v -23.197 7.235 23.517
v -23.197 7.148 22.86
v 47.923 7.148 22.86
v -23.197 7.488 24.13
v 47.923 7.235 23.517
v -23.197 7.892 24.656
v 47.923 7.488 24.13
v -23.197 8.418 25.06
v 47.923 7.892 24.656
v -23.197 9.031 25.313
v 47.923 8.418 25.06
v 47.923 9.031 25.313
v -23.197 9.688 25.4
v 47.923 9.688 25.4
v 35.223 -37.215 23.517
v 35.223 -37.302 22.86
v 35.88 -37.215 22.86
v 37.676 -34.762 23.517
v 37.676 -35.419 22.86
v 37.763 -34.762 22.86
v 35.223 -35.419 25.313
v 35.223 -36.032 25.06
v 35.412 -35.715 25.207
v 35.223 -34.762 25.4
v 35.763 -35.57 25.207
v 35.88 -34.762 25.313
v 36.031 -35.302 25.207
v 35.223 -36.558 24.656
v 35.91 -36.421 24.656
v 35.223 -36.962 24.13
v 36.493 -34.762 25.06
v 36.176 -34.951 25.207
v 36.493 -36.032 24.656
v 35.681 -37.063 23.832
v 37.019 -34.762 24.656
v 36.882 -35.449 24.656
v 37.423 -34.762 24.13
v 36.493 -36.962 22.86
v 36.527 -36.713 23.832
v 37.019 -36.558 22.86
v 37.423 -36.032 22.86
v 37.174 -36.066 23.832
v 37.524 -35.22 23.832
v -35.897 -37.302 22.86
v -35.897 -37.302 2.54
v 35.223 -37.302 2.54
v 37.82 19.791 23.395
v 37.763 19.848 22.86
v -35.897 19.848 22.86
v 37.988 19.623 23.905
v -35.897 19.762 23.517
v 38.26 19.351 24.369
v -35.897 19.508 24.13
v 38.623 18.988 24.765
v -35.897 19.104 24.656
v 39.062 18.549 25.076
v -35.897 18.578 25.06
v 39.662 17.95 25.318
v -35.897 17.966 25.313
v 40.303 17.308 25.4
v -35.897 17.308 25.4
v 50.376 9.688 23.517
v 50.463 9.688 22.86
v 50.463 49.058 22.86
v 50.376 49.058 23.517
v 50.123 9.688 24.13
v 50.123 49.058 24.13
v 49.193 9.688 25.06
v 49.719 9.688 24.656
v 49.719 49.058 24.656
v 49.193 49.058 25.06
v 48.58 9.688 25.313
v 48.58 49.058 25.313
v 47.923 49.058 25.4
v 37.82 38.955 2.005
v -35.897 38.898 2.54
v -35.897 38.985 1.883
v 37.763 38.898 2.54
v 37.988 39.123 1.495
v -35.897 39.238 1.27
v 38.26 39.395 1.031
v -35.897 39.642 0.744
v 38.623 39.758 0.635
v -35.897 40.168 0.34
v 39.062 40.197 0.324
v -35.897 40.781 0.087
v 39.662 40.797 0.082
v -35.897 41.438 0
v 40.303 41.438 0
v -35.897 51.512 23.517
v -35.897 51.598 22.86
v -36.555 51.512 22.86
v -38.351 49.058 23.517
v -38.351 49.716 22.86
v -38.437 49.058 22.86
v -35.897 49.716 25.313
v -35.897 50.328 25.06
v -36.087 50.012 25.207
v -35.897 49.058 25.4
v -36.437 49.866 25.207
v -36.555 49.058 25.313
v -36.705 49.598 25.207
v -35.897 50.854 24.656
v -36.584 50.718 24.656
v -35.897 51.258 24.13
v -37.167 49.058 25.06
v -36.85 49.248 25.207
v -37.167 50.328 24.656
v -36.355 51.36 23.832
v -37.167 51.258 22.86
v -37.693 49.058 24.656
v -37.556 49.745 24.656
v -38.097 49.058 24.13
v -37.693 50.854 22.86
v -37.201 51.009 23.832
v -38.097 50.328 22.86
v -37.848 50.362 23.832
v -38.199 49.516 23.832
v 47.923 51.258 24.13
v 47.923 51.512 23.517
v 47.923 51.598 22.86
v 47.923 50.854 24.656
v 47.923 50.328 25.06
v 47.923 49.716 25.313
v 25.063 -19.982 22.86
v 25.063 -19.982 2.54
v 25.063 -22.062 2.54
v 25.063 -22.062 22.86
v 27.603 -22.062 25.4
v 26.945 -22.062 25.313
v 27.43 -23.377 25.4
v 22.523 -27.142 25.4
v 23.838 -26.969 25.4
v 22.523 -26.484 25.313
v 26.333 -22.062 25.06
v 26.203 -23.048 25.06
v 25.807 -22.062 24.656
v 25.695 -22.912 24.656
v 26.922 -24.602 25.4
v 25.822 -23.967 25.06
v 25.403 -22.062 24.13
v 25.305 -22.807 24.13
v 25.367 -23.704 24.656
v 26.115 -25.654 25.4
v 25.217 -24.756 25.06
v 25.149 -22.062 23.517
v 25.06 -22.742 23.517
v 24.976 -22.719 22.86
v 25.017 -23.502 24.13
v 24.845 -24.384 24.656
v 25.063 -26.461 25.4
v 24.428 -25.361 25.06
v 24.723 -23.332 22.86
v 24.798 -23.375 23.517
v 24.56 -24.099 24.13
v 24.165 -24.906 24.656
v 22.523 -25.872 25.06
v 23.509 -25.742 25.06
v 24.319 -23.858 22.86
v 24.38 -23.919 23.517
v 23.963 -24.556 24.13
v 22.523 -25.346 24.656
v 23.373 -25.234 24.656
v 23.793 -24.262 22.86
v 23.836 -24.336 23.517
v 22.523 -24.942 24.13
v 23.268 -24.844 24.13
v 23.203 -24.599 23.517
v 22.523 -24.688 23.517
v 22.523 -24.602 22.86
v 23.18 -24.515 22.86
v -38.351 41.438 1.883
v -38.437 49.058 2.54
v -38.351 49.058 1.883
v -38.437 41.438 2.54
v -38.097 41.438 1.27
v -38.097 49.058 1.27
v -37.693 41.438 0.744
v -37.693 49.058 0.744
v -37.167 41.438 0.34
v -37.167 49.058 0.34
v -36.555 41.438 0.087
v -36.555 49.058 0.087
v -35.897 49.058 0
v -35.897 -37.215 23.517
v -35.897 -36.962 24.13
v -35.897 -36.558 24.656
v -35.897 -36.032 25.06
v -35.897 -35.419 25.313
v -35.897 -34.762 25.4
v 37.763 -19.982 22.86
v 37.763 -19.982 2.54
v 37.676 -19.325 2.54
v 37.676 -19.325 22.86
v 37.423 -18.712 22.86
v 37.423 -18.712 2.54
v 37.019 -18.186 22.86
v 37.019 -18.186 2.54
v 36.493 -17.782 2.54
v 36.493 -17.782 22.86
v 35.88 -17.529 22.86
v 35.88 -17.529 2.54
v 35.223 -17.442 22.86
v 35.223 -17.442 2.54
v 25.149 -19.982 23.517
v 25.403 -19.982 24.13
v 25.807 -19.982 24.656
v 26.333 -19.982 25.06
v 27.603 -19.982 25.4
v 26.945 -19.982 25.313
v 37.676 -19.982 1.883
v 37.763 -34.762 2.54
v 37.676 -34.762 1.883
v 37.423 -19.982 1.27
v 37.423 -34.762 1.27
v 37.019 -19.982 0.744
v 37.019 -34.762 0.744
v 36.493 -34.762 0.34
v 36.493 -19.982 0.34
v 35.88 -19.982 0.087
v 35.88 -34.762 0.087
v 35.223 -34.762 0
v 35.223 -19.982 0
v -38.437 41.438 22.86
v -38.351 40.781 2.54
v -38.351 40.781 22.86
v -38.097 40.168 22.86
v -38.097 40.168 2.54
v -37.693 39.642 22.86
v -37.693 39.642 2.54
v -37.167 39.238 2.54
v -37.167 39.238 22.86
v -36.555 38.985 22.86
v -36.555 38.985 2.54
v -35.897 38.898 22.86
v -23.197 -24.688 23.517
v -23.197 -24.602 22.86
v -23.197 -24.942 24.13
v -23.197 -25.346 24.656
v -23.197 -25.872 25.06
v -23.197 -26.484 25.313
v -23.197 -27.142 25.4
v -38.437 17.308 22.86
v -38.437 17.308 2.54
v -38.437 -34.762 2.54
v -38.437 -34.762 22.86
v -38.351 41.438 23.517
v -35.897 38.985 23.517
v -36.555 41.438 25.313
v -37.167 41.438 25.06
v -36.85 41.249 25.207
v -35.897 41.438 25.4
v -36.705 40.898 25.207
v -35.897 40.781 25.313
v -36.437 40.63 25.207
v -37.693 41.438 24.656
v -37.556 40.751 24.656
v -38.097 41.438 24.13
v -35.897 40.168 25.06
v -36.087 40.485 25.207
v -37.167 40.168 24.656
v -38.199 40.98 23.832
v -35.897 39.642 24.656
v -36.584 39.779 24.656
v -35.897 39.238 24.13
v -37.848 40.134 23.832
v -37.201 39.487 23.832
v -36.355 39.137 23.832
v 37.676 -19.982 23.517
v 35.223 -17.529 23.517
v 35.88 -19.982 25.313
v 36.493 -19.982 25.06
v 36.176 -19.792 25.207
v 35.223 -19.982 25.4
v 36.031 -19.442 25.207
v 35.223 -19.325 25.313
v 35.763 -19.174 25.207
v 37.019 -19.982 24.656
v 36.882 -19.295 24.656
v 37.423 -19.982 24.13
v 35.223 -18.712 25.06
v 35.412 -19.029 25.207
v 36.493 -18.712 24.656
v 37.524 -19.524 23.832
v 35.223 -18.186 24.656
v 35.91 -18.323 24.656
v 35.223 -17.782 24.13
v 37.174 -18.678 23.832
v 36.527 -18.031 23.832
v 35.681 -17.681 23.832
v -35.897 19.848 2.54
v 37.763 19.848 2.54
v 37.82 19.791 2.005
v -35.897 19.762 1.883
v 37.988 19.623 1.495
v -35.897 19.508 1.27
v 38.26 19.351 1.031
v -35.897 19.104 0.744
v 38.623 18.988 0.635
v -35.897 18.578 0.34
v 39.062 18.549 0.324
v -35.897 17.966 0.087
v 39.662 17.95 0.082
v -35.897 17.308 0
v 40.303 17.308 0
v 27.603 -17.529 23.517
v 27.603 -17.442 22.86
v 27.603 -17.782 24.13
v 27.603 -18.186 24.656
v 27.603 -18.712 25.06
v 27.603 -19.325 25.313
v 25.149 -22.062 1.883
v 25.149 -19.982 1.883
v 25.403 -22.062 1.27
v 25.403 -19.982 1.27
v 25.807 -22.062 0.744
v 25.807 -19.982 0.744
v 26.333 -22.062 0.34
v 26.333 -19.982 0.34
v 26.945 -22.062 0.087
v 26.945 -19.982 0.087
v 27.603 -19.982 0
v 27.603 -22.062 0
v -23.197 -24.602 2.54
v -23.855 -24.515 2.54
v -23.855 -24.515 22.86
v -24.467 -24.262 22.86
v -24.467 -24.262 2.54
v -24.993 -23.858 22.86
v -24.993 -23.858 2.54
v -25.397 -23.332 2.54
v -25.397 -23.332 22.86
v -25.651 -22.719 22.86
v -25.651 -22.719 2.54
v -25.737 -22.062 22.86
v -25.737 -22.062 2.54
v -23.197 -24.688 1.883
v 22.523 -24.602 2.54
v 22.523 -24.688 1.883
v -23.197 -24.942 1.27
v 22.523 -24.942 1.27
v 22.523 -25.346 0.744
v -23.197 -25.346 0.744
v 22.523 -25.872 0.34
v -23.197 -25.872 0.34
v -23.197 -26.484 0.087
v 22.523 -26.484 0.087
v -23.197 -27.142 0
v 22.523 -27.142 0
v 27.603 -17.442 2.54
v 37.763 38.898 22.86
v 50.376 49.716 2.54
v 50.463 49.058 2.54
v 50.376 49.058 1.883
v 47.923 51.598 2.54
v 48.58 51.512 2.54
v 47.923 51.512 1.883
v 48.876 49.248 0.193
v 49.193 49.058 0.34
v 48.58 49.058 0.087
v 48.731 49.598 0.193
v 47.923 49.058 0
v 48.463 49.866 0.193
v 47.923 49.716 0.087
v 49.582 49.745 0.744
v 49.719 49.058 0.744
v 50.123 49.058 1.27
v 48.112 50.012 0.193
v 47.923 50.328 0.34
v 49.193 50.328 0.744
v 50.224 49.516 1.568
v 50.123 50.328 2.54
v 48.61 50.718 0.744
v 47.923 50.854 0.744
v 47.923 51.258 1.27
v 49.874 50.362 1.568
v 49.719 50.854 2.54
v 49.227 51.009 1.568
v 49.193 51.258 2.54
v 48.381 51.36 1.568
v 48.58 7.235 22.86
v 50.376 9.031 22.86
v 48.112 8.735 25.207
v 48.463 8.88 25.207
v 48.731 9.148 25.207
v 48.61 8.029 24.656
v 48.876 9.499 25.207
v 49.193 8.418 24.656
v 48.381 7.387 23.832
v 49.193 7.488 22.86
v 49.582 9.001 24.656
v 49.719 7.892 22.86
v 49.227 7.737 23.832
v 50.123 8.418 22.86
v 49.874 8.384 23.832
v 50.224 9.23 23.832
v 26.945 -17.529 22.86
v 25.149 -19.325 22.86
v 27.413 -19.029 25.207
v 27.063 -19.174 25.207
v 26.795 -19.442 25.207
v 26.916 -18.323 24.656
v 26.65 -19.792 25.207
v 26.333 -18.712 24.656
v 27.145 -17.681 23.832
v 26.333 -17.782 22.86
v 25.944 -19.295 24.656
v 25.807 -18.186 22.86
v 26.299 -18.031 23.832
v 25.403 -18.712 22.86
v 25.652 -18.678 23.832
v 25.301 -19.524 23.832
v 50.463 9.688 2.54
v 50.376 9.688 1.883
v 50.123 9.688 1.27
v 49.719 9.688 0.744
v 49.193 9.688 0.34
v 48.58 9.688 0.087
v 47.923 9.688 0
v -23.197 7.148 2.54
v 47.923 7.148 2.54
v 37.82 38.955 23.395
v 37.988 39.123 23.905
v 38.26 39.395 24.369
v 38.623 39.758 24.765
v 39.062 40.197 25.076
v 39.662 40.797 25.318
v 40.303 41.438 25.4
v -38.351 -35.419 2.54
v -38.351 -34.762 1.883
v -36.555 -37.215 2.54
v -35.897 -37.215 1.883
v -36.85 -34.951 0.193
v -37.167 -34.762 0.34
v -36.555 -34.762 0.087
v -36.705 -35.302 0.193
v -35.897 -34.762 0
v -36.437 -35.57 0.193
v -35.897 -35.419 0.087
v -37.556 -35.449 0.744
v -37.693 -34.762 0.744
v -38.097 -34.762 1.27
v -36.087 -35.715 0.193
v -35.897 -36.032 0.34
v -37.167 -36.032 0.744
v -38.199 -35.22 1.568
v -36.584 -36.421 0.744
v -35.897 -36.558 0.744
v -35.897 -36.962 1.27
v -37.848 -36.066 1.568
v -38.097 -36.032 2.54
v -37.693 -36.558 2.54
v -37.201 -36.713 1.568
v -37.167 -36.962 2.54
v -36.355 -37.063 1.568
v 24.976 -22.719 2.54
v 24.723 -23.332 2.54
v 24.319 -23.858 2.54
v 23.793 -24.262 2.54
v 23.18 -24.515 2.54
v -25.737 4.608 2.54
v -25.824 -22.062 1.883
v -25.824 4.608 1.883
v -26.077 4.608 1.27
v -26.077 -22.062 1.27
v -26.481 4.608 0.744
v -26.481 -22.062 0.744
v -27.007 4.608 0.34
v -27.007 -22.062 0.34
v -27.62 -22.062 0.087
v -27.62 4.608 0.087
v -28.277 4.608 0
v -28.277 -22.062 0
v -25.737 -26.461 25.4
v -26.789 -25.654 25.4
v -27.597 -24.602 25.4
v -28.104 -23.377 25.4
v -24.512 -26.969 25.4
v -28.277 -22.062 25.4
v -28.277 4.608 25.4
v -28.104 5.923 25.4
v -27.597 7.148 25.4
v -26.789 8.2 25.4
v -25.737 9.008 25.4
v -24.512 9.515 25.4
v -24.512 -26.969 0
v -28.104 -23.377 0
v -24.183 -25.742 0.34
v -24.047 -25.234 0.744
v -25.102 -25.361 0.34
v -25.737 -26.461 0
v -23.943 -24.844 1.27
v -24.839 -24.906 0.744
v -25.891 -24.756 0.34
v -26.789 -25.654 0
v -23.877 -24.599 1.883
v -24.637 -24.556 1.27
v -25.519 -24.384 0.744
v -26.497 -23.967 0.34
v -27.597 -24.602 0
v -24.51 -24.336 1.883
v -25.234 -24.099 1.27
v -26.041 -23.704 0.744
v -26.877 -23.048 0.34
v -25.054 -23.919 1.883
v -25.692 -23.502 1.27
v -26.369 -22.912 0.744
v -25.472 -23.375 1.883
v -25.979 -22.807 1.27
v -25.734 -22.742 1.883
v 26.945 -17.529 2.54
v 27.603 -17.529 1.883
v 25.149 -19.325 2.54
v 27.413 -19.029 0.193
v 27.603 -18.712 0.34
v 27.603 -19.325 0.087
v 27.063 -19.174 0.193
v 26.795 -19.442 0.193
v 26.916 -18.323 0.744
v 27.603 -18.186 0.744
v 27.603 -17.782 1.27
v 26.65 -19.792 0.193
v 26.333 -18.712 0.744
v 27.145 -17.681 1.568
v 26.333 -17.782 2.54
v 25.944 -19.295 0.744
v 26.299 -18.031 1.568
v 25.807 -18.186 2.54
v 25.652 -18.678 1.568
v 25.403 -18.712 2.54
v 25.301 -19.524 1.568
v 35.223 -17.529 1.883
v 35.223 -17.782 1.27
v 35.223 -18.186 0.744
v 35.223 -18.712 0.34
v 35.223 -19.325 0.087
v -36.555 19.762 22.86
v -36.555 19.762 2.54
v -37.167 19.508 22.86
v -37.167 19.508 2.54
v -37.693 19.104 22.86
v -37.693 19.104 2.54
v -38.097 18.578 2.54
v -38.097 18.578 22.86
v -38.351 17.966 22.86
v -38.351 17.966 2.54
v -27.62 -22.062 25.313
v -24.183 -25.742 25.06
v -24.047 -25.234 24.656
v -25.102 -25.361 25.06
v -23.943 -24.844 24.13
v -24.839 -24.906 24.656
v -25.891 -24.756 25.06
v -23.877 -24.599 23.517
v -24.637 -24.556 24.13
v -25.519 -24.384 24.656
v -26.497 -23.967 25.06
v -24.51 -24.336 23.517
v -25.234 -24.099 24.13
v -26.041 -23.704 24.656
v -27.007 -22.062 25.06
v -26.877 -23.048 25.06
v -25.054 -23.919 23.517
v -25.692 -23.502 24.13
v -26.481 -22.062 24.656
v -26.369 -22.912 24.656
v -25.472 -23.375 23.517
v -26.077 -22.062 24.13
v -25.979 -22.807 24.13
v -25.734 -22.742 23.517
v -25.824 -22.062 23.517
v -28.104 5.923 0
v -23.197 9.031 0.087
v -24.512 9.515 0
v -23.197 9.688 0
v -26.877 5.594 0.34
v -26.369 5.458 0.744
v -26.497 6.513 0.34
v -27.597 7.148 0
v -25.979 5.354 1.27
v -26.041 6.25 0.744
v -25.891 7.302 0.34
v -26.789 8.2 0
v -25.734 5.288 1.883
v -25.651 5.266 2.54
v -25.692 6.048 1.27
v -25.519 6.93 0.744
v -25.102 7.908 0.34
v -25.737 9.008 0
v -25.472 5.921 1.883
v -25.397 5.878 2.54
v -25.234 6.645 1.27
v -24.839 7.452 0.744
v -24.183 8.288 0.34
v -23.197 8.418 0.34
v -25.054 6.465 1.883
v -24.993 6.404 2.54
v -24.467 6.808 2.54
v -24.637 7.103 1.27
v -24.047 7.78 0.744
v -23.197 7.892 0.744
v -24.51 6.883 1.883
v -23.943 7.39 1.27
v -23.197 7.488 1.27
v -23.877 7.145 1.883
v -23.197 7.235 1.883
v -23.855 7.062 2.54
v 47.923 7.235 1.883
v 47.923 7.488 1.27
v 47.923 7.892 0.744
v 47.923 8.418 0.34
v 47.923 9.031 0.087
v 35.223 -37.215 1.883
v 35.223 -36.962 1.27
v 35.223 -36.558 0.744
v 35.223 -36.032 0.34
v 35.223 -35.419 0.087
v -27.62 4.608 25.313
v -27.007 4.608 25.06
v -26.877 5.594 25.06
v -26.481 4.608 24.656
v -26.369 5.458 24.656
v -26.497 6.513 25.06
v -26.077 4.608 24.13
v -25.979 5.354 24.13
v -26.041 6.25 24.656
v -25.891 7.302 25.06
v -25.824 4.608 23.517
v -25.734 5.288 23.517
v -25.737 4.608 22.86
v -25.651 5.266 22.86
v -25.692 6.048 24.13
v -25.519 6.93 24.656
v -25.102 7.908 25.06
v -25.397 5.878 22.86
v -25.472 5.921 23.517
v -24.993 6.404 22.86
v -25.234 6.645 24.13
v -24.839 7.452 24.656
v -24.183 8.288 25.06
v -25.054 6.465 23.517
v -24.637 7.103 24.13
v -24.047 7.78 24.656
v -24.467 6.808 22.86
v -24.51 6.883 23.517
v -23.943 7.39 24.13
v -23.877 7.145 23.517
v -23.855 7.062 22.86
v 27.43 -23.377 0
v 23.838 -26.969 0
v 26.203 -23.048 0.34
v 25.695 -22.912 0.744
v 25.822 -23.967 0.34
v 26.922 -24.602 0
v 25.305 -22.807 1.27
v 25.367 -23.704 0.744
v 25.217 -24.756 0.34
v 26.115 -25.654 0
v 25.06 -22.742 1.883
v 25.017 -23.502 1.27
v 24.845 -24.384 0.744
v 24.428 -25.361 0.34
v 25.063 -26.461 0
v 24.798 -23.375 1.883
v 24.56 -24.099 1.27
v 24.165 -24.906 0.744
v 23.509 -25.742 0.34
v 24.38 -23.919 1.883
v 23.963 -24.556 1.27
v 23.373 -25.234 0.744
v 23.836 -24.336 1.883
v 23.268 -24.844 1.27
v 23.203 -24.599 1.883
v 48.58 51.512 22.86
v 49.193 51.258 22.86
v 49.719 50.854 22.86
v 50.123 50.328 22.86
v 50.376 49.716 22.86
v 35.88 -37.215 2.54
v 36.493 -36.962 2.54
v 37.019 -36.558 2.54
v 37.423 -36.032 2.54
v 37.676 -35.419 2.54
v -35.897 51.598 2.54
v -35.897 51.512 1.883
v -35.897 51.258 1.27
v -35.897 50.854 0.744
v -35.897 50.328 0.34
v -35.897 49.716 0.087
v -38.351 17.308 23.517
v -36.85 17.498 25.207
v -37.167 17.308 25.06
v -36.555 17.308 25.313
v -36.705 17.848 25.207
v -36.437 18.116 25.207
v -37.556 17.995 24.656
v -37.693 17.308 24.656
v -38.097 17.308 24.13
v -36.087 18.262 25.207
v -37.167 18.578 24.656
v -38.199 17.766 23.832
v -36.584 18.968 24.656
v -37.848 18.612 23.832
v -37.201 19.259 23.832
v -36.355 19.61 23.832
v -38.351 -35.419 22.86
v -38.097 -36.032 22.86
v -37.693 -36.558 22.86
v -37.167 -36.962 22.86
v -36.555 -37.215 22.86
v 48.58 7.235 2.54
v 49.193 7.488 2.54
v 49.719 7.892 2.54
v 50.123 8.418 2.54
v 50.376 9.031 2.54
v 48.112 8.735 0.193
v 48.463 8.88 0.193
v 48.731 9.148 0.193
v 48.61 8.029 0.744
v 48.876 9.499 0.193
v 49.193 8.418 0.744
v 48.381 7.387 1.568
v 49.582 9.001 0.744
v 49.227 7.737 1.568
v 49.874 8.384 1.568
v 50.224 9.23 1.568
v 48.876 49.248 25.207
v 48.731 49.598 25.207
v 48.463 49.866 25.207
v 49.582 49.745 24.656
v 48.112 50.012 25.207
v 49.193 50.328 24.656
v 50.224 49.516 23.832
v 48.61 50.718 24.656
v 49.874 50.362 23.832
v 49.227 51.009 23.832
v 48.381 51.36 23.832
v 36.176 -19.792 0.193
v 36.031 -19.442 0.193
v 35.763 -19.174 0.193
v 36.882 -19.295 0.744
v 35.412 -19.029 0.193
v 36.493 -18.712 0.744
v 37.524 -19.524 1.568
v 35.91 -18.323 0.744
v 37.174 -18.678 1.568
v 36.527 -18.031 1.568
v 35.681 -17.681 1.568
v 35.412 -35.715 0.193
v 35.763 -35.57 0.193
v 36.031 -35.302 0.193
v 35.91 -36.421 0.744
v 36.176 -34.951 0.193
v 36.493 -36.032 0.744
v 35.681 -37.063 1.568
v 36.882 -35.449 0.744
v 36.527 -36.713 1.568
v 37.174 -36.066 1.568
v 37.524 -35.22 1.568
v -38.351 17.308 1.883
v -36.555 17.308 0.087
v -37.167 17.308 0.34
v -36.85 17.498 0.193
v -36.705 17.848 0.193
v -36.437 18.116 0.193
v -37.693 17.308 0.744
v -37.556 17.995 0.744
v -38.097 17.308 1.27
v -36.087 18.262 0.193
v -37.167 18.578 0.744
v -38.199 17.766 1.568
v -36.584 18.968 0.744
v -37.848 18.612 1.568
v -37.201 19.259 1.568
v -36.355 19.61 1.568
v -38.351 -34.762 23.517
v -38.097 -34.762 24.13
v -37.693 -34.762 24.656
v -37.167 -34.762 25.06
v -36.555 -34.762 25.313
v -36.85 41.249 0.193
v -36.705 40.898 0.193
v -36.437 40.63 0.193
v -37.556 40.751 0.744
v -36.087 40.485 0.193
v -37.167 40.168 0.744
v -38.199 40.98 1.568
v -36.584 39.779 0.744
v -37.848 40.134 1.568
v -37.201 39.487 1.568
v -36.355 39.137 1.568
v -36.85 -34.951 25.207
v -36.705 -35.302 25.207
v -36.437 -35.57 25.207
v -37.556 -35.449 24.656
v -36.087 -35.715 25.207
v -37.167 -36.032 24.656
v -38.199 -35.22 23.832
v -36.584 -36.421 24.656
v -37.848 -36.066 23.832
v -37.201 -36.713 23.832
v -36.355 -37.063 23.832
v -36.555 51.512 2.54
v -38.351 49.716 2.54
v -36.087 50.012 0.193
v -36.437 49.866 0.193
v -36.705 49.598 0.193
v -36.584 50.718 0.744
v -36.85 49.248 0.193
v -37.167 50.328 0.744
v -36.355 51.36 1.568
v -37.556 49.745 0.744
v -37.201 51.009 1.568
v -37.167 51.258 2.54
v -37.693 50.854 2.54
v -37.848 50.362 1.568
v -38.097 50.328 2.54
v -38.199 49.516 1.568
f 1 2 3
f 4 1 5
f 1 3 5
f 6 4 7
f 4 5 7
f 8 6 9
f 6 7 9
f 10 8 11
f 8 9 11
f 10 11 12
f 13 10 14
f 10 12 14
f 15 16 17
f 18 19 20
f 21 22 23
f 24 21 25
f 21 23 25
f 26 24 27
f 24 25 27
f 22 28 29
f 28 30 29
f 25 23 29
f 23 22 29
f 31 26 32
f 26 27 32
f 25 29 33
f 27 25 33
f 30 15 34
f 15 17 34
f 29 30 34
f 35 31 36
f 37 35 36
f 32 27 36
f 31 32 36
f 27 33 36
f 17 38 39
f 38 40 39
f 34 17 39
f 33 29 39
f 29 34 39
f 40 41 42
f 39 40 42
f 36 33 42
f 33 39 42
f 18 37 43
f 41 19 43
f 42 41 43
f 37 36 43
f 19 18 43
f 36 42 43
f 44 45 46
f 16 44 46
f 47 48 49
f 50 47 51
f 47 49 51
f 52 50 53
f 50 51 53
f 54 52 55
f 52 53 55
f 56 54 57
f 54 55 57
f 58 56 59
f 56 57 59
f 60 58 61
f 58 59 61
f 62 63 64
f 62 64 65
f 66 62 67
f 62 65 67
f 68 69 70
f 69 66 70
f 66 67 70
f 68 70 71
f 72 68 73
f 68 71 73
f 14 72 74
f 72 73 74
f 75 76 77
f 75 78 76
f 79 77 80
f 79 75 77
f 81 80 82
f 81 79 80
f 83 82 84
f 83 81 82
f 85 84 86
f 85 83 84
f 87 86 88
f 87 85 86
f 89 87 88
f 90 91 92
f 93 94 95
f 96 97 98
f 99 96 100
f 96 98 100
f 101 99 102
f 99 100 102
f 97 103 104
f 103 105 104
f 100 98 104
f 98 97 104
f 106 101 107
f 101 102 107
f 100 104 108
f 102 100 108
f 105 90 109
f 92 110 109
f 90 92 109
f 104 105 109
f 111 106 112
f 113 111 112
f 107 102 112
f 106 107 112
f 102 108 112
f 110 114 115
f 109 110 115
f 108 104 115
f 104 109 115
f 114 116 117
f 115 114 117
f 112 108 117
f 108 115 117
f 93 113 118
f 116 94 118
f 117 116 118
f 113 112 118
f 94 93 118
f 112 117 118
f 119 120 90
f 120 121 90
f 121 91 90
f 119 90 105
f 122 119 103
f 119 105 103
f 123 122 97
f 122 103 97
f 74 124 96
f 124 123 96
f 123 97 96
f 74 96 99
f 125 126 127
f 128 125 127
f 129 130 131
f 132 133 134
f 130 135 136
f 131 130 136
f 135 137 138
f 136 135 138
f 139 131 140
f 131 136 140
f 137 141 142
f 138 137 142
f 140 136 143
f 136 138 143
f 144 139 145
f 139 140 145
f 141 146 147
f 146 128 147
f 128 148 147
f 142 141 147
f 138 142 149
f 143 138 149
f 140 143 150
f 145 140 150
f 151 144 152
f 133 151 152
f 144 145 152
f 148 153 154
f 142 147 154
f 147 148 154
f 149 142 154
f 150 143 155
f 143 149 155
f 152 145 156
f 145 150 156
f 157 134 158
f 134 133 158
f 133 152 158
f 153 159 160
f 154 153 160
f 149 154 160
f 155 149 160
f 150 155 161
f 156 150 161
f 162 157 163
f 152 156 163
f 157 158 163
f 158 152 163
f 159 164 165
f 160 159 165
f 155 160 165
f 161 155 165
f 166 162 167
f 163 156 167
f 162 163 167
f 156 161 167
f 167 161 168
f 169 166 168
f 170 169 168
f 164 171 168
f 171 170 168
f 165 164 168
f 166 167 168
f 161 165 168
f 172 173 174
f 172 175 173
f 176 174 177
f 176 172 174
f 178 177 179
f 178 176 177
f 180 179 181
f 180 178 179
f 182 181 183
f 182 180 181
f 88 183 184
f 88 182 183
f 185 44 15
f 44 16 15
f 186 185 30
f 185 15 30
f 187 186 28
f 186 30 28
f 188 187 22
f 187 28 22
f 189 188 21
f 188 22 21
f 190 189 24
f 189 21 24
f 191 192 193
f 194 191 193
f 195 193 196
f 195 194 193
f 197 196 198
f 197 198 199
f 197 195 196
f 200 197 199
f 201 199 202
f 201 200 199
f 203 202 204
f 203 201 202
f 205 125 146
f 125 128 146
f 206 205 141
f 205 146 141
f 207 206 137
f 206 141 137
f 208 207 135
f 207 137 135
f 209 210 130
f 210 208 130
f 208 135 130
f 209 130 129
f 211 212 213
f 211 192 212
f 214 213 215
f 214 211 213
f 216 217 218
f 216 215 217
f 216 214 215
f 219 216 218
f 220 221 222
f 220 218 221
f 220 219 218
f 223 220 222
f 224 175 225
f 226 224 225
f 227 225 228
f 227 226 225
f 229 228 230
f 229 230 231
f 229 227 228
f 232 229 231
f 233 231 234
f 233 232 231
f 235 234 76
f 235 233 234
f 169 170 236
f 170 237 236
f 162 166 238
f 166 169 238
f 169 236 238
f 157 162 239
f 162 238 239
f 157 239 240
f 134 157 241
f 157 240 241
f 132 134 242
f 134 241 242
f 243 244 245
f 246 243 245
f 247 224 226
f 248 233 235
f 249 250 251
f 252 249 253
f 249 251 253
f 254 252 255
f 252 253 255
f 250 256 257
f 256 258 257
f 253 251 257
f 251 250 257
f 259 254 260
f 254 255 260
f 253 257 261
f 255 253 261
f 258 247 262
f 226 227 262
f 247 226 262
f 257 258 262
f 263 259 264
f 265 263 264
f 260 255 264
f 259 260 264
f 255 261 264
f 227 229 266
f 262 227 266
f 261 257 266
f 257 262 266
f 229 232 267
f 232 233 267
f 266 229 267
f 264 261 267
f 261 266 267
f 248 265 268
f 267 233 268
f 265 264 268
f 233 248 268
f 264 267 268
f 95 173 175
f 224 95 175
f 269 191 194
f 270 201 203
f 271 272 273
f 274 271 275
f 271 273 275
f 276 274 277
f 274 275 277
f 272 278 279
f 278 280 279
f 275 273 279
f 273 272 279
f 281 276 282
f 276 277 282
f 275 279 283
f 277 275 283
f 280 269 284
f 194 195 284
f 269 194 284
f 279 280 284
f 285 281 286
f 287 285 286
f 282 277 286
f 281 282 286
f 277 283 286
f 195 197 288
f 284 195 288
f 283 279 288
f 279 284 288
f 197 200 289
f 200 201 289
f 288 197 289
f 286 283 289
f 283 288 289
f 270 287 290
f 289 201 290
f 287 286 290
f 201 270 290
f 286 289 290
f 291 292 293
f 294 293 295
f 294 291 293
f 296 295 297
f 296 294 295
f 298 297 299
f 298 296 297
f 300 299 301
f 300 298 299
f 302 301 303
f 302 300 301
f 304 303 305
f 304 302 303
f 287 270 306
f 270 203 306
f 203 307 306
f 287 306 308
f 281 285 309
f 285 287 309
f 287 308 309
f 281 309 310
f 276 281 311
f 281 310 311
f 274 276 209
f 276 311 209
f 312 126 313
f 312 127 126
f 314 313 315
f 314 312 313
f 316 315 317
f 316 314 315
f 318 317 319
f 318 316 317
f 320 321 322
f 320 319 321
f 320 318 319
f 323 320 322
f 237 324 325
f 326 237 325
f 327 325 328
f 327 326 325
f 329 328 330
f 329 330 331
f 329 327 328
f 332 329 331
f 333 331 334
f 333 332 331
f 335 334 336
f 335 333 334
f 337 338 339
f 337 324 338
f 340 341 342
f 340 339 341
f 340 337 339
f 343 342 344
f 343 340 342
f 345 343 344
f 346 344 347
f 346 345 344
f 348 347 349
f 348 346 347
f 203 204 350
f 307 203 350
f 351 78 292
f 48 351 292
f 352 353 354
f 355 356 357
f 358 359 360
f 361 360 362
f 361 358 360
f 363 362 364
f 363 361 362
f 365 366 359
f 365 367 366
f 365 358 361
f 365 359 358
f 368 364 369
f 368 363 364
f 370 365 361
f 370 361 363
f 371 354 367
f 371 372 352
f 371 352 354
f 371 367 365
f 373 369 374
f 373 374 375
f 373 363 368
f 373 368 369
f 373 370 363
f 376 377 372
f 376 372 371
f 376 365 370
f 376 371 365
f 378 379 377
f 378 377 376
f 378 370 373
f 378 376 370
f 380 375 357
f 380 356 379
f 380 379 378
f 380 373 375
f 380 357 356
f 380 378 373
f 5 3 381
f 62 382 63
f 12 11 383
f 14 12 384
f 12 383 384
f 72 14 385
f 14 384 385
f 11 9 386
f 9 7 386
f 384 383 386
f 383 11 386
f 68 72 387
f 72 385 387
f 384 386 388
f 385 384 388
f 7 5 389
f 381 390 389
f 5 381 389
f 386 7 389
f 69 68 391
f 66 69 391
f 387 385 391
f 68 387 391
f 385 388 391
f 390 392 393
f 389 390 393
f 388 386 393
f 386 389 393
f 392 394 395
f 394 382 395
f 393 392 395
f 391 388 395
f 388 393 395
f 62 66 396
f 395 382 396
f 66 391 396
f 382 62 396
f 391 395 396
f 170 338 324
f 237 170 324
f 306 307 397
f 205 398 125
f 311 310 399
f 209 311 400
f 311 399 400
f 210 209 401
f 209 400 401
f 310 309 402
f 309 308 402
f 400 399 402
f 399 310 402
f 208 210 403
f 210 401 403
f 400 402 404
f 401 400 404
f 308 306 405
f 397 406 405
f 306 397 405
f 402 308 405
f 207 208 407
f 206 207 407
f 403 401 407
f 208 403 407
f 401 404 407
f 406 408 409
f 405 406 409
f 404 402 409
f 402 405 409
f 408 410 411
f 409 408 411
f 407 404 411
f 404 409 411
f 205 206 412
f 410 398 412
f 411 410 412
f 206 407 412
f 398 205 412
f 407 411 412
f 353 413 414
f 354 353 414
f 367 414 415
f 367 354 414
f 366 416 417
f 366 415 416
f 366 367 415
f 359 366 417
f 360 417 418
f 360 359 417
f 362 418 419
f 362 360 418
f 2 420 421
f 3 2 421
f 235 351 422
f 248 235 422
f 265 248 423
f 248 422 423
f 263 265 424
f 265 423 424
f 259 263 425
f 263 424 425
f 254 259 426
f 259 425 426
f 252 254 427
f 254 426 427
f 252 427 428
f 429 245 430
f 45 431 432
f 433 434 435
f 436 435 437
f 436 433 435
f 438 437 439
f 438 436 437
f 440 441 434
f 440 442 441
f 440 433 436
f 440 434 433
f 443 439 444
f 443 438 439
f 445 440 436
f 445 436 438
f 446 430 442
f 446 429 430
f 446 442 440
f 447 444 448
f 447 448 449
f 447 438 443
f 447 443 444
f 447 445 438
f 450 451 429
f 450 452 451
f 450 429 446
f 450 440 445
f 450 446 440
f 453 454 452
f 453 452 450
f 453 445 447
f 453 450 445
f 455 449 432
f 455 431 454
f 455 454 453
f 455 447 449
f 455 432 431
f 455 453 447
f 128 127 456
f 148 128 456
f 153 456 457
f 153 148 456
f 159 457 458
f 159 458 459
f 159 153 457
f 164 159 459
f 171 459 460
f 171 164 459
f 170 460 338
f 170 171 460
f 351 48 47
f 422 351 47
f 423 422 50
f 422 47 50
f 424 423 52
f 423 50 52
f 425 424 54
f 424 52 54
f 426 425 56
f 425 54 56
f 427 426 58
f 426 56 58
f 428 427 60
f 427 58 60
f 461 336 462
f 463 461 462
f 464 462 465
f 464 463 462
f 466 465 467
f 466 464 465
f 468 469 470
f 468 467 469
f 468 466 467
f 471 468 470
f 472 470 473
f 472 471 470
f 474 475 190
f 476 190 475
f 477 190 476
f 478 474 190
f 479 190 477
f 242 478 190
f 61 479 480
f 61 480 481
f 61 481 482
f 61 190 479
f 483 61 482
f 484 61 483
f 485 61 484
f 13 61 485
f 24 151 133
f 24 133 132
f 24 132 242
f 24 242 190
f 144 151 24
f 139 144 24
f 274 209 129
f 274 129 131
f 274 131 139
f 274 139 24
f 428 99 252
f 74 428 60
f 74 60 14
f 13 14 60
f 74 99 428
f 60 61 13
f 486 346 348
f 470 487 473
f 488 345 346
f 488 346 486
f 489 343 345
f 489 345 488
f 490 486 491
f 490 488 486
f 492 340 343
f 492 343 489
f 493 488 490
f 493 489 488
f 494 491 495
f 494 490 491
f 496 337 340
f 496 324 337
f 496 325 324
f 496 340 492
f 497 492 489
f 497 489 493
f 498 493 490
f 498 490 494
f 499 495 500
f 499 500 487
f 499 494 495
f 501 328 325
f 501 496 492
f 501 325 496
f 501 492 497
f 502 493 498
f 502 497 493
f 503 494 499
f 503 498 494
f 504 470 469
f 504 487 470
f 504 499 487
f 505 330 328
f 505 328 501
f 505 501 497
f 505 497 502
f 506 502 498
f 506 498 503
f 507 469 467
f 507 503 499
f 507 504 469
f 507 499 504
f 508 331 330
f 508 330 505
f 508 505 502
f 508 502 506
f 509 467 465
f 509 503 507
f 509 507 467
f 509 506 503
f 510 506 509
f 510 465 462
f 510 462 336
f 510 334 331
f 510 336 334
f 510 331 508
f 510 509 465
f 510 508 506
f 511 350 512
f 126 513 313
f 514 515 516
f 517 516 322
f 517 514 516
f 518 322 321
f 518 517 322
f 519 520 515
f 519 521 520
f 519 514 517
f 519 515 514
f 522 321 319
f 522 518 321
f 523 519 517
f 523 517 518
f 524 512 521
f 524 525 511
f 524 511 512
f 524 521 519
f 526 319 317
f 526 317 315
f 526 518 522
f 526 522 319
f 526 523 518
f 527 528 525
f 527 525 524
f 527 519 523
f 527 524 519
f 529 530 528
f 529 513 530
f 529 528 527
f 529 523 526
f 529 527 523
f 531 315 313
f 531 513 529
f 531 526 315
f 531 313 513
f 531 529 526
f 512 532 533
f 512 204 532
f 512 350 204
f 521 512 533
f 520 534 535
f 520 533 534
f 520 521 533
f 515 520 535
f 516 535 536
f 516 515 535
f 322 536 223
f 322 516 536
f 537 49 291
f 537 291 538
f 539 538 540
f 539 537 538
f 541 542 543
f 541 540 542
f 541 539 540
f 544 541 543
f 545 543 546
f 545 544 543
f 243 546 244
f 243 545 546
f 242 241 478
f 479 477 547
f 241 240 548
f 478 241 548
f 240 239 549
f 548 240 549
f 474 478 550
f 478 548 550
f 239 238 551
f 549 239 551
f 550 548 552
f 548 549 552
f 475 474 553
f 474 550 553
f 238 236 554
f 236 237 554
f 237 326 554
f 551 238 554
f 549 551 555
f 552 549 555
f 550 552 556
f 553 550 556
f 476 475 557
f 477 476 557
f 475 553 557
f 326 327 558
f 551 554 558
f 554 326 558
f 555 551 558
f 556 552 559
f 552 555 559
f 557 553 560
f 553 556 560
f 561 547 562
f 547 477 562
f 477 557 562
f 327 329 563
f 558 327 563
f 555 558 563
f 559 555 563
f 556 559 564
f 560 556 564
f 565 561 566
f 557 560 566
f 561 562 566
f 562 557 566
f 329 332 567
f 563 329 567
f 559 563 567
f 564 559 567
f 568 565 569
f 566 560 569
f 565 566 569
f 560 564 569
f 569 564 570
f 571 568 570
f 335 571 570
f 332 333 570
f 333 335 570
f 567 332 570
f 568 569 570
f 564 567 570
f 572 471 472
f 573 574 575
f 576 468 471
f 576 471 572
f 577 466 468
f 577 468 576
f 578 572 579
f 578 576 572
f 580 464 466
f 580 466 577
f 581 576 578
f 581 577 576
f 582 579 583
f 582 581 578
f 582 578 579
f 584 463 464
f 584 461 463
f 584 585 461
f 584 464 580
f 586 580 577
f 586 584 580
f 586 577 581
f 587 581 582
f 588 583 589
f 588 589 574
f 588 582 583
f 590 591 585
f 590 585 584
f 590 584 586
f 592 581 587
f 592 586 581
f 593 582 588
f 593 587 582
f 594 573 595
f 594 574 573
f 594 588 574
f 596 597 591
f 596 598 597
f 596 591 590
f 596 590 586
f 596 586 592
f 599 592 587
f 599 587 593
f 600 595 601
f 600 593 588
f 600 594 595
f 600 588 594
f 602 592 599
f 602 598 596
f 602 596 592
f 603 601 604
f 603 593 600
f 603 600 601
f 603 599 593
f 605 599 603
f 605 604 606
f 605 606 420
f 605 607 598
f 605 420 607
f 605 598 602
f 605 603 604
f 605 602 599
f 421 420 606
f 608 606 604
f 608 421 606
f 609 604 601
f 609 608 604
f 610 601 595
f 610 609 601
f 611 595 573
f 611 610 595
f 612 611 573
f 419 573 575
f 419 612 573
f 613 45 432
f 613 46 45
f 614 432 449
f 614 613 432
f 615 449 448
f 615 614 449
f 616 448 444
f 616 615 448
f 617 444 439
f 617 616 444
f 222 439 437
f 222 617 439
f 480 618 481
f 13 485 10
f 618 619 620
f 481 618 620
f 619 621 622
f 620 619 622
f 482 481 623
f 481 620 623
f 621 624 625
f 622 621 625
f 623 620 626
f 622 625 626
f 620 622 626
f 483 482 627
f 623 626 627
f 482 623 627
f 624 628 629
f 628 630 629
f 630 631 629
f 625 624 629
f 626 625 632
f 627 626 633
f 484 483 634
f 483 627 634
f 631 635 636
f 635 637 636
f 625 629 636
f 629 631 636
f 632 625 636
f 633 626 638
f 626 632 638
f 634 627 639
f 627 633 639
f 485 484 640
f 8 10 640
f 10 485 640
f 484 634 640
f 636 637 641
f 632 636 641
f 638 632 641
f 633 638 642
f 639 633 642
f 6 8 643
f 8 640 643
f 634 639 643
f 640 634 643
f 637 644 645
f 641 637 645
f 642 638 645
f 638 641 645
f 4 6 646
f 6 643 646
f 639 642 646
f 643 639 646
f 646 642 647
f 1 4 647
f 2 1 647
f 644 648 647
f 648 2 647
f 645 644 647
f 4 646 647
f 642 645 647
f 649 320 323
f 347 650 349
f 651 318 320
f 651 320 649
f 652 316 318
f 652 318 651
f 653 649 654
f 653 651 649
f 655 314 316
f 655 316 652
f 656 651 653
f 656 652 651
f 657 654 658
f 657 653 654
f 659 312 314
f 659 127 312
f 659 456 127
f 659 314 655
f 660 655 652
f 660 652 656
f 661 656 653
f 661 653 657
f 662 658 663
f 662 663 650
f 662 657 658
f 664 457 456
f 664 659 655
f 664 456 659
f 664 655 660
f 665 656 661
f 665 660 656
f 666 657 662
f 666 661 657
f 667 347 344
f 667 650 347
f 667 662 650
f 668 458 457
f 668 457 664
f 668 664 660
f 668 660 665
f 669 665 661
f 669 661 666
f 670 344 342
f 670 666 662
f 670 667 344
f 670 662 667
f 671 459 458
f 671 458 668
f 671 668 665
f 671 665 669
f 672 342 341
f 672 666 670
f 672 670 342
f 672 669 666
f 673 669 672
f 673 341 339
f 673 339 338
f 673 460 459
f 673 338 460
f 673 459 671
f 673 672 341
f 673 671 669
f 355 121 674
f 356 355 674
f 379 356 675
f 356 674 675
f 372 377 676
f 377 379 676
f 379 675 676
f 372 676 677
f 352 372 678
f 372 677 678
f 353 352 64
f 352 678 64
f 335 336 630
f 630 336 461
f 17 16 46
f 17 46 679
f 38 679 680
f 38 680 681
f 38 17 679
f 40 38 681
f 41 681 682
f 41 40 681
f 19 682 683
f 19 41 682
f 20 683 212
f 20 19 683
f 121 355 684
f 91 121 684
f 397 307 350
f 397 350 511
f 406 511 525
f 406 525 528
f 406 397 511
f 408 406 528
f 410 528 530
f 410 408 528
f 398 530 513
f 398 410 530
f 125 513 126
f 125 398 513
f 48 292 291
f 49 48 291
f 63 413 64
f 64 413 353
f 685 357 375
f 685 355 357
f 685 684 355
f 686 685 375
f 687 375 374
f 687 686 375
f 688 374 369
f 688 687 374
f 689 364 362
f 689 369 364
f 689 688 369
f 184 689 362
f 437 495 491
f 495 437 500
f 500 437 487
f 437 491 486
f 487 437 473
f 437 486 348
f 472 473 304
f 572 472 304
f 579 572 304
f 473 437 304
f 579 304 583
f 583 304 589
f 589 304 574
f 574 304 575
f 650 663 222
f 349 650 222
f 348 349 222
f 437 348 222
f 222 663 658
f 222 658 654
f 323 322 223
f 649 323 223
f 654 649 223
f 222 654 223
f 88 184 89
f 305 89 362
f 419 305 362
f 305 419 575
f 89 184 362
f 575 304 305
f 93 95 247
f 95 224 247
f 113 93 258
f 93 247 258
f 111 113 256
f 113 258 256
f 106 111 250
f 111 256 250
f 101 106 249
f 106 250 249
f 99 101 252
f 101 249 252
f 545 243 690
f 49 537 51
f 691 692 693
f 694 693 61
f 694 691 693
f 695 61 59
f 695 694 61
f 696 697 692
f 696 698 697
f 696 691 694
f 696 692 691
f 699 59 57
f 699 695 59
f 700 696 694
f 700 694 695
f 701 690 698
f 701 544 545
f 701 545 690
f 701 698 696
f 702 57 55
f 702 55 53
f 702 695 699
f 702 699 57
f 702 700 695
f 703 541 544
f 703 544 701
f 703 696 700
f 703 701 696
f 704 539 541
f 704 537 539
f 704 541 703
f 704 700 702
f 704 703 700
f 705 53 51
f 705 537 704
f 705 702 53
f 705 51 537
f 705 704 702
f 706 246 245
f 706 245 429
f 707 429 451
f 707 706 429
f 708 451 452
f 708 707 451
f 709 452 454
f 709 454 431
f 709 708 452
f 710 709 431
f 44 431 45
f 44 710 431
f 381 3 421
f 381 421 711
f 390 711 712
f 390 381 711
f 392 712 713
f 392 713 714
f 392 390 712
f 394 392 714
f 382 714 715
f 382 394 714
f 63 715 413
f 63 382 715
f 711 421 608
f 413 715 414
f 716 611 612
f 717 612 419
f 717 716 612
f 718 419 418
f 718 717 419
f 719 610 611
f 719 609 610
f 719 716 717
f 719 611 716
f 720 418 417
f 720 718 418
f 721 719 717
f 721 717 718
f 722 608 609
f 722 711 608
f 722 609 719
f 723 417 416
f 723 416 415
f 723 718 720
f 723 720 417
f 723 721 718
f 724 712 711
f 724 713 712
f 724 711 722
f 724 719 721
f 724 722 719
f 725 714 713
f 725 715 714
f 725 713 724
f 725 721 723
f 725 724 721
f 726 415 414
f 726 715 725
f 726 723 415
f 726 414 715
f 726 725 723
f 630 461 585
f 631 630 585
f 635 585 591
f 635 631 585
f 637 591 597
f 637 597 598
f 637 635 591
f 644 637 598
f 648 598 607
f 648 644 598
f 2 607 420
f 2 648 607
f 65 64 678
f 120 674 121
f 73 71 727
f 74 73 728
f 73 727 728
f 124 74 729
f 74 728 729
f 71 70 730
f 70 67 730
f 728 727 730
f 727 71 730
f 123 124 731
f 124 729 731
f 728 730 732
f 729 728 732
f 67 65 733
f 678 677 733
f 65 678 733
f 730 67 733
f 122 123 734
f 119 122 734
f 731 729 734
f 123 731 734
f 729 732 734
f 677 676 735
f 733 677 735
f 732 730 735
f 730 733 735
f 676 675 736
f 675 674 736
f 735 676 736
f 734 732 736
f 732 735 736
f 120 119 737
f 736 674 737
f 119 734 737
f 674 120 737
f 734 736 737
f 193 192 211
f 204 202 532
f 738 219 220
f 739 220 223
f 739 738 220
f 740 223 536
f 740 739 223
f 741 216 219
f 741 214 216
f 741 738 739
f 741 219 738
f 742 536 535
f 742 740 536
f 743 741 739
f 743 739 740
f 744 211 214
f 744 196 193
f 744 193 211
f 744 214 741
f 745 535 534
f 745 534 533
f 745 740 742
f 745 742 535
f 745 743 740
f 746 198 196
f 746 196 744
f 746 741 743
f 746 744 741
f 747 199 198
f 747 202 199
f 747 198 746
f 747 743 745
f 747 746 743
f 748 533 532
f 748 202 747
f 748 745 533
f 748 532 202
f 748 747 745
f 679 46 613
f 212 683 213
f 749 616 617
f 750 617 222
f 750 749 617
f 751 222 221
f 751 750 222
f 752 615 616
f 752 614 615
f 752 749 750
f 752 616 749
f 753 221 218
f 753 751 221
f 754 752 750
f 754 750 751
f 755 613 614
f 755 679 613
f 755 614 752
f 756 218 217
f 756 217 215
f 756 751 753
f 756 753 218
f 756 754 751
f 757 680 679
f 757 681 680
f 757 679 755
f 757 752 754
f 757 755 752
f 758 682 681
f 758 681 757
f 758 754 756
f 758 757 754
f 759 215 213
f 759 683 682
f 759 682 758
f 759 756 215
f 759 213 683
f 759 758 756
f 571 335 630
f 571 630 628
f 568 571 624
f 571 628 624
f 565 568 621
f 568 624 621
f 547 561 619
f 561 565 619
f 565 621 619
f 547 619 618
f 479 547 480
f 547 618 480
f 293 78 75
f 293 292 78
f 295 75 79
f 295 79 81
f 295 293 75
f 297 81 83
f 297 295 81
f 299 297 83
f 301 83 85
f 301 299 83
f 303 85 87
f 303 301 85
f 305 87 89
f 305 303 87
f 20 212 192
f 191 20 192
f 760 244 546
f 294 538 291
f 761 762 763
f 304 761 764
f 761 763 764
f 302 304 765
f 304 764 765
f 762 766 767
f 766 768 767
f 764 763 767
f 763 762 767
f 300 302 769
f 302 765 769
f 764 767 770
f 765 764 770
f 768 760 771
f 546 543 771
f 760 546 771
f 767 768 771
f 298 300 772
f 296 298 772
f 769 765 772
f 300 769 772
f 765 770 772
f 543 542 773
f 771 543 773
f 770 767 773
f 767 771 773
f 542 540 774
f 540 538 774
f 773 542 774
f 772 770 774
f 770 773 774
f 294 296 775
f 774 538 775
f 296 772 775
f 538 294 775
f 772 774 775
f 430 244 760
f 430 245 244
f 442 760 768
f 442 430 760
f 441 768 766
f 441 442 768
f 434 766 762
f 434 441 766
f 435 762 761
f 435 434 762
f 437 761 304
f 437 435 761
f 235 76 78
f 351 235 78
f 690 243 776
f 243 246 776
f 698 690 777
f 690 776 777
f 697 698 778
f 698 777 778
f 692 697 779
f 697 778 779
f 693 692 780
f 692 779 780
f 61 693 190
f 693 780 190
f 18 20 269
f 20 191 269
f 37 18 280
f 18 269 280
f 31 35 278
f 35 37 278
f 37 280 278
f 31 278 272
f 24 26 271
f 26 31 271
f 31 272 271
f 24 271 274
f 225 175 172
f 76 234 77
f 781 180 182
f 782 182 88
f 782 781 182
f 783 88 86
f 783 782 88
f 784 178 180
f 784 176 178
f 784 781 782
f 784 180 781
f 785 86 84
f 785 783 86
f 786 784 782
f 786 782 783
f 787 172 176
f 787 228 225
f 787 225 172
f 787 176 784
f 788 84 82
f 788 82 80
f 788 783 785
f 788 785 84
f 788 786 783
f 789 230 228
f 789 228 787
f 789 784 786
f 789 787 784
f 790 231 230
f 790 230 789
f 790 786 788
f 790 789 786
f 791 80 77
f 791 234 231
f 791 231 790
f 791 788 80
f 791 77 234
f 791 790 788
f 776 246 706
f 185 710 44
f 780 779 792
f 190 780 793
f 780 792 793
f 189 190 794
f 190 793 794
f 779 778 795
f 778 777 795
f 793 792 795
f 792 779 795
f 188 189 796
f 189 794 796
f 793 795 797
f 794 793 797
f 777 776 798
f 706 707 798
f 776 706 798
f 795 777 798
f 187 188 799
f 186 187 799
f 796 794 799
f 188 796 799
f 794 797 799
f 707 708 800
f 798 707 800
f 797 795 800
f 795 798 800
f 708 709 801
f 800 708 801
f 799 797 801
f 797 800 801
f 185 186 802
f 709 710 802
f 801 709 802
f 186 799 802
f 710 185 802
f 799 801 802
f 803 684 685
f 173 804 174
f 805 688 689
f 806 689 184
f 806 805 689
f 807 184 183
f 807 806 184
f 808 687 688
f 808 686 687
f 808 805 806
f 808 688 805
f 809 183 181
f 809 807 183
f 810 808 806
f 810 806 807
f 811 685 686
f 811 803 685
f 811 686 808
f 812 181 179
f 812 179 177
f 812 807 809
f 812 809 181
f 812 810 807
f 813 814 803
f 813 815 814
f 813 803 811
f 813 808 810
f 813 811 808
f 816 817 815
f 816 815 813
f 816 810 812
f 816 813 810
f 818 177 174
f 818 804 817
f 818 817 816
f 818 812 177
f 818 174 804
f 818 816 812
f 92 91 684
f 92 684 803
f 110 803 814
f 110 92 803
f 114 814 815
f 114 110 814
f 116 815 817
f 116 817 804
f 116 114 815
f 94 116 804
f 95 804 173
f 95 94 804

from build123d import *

# Parameters (mm, degrees)
F1_DEPTH = 25.4
F2_R     = 2.54


with BuildPart() as f1:
    # F0 (on Top) → F1 (new body)
    with BuildSketch(Plane.XY):
        Polygon((50.462863, 51.598176), (-38.437137, 51.598176), (-38.437137, 38.898176), (37.762863, 38.898176), (37.762863, 19.848176), (-38.437137, 19.848176), (-38.437137, -37.301824), (37.762863, -37.301824), (37.762863, -17.442089), (25.062863, -17.442089), (25.062863, -24.601824), (-25.737137, -24.601824), (-25.737137, 7.148176), (50.462863, 7.148176), align=None)
    extrude(amount=F1_DEPTH)

    # F2
    f2_edges = [f1.edges().sort_by_distance(p)[0] for p in [
        (-38.437137, 51.598176, 12.7),
        (50.462863, 51.598176, 12.7),
        (50.462863, 7.148176, 12.7),
        (-38.437137, 19.848176, 12.7),
        (-38.437137, -37.301824, 12.7),
        (37.762863, -37.301824, 12.7),
        (25.062863, -17.442089, 12.7),
        (37.762863, -17.442089, 12.7),
        (-25.737137, 7.148176, 12.7),
        (-25.737137, -24.601824, 12.7),
        (25.062863, -24.601824, 12.7),
        (-38.437137, 38.898176, 12.7),
        (-38.437137, -8.726824, 25.4),
        (-0.337137, -37.301824, 25.4),
        (37.762863, -27.371956, 25.4),
        (31.412863, -17.442089, 25.4),
        (25.062863, -21.021956, 25.4),
        (-0.337137, -24.601824, 25.4),
        (-25.737137, -8.726824, 25.4),
        (12.362863, 7.148176, 25.4),
        (50.462863, 29.373176, 25.4),
        (6.012863, 51.598176, 25.4),
        (-38.437137, 45.248176, 25.4),
        (-0.337137, 38.898176, 25.4),
        (37.762863, 29.373176, 25.4),
        (-0.337137, 19.848176, 25.4),
        (-38.437137, -8.726824, 0),
        (-0.337137, -37.301824, 0),
        (37.762863, -27.371956, 0),
        (31.412863, -17.442089, 0),
        (25.062863, -21.021956, 0),
        (-0.337137, -24.601824, 0),
        (-25.737137, -8.726824, 0),
        (12.362863, 7.148176, 0),
        (50.462863, 29.373176, 0),
        (6.012863, 51.598176, 0),
        (-38.437137, 45.248176, 0),
        (-0.337137, 38.898176, 0),
        (37.762863, 29.373176, 0),
        (-0.337137, 19.848176, 0),
    ]]
    fillet(f2_edges, radius=F2_R)


solid = f1.part
